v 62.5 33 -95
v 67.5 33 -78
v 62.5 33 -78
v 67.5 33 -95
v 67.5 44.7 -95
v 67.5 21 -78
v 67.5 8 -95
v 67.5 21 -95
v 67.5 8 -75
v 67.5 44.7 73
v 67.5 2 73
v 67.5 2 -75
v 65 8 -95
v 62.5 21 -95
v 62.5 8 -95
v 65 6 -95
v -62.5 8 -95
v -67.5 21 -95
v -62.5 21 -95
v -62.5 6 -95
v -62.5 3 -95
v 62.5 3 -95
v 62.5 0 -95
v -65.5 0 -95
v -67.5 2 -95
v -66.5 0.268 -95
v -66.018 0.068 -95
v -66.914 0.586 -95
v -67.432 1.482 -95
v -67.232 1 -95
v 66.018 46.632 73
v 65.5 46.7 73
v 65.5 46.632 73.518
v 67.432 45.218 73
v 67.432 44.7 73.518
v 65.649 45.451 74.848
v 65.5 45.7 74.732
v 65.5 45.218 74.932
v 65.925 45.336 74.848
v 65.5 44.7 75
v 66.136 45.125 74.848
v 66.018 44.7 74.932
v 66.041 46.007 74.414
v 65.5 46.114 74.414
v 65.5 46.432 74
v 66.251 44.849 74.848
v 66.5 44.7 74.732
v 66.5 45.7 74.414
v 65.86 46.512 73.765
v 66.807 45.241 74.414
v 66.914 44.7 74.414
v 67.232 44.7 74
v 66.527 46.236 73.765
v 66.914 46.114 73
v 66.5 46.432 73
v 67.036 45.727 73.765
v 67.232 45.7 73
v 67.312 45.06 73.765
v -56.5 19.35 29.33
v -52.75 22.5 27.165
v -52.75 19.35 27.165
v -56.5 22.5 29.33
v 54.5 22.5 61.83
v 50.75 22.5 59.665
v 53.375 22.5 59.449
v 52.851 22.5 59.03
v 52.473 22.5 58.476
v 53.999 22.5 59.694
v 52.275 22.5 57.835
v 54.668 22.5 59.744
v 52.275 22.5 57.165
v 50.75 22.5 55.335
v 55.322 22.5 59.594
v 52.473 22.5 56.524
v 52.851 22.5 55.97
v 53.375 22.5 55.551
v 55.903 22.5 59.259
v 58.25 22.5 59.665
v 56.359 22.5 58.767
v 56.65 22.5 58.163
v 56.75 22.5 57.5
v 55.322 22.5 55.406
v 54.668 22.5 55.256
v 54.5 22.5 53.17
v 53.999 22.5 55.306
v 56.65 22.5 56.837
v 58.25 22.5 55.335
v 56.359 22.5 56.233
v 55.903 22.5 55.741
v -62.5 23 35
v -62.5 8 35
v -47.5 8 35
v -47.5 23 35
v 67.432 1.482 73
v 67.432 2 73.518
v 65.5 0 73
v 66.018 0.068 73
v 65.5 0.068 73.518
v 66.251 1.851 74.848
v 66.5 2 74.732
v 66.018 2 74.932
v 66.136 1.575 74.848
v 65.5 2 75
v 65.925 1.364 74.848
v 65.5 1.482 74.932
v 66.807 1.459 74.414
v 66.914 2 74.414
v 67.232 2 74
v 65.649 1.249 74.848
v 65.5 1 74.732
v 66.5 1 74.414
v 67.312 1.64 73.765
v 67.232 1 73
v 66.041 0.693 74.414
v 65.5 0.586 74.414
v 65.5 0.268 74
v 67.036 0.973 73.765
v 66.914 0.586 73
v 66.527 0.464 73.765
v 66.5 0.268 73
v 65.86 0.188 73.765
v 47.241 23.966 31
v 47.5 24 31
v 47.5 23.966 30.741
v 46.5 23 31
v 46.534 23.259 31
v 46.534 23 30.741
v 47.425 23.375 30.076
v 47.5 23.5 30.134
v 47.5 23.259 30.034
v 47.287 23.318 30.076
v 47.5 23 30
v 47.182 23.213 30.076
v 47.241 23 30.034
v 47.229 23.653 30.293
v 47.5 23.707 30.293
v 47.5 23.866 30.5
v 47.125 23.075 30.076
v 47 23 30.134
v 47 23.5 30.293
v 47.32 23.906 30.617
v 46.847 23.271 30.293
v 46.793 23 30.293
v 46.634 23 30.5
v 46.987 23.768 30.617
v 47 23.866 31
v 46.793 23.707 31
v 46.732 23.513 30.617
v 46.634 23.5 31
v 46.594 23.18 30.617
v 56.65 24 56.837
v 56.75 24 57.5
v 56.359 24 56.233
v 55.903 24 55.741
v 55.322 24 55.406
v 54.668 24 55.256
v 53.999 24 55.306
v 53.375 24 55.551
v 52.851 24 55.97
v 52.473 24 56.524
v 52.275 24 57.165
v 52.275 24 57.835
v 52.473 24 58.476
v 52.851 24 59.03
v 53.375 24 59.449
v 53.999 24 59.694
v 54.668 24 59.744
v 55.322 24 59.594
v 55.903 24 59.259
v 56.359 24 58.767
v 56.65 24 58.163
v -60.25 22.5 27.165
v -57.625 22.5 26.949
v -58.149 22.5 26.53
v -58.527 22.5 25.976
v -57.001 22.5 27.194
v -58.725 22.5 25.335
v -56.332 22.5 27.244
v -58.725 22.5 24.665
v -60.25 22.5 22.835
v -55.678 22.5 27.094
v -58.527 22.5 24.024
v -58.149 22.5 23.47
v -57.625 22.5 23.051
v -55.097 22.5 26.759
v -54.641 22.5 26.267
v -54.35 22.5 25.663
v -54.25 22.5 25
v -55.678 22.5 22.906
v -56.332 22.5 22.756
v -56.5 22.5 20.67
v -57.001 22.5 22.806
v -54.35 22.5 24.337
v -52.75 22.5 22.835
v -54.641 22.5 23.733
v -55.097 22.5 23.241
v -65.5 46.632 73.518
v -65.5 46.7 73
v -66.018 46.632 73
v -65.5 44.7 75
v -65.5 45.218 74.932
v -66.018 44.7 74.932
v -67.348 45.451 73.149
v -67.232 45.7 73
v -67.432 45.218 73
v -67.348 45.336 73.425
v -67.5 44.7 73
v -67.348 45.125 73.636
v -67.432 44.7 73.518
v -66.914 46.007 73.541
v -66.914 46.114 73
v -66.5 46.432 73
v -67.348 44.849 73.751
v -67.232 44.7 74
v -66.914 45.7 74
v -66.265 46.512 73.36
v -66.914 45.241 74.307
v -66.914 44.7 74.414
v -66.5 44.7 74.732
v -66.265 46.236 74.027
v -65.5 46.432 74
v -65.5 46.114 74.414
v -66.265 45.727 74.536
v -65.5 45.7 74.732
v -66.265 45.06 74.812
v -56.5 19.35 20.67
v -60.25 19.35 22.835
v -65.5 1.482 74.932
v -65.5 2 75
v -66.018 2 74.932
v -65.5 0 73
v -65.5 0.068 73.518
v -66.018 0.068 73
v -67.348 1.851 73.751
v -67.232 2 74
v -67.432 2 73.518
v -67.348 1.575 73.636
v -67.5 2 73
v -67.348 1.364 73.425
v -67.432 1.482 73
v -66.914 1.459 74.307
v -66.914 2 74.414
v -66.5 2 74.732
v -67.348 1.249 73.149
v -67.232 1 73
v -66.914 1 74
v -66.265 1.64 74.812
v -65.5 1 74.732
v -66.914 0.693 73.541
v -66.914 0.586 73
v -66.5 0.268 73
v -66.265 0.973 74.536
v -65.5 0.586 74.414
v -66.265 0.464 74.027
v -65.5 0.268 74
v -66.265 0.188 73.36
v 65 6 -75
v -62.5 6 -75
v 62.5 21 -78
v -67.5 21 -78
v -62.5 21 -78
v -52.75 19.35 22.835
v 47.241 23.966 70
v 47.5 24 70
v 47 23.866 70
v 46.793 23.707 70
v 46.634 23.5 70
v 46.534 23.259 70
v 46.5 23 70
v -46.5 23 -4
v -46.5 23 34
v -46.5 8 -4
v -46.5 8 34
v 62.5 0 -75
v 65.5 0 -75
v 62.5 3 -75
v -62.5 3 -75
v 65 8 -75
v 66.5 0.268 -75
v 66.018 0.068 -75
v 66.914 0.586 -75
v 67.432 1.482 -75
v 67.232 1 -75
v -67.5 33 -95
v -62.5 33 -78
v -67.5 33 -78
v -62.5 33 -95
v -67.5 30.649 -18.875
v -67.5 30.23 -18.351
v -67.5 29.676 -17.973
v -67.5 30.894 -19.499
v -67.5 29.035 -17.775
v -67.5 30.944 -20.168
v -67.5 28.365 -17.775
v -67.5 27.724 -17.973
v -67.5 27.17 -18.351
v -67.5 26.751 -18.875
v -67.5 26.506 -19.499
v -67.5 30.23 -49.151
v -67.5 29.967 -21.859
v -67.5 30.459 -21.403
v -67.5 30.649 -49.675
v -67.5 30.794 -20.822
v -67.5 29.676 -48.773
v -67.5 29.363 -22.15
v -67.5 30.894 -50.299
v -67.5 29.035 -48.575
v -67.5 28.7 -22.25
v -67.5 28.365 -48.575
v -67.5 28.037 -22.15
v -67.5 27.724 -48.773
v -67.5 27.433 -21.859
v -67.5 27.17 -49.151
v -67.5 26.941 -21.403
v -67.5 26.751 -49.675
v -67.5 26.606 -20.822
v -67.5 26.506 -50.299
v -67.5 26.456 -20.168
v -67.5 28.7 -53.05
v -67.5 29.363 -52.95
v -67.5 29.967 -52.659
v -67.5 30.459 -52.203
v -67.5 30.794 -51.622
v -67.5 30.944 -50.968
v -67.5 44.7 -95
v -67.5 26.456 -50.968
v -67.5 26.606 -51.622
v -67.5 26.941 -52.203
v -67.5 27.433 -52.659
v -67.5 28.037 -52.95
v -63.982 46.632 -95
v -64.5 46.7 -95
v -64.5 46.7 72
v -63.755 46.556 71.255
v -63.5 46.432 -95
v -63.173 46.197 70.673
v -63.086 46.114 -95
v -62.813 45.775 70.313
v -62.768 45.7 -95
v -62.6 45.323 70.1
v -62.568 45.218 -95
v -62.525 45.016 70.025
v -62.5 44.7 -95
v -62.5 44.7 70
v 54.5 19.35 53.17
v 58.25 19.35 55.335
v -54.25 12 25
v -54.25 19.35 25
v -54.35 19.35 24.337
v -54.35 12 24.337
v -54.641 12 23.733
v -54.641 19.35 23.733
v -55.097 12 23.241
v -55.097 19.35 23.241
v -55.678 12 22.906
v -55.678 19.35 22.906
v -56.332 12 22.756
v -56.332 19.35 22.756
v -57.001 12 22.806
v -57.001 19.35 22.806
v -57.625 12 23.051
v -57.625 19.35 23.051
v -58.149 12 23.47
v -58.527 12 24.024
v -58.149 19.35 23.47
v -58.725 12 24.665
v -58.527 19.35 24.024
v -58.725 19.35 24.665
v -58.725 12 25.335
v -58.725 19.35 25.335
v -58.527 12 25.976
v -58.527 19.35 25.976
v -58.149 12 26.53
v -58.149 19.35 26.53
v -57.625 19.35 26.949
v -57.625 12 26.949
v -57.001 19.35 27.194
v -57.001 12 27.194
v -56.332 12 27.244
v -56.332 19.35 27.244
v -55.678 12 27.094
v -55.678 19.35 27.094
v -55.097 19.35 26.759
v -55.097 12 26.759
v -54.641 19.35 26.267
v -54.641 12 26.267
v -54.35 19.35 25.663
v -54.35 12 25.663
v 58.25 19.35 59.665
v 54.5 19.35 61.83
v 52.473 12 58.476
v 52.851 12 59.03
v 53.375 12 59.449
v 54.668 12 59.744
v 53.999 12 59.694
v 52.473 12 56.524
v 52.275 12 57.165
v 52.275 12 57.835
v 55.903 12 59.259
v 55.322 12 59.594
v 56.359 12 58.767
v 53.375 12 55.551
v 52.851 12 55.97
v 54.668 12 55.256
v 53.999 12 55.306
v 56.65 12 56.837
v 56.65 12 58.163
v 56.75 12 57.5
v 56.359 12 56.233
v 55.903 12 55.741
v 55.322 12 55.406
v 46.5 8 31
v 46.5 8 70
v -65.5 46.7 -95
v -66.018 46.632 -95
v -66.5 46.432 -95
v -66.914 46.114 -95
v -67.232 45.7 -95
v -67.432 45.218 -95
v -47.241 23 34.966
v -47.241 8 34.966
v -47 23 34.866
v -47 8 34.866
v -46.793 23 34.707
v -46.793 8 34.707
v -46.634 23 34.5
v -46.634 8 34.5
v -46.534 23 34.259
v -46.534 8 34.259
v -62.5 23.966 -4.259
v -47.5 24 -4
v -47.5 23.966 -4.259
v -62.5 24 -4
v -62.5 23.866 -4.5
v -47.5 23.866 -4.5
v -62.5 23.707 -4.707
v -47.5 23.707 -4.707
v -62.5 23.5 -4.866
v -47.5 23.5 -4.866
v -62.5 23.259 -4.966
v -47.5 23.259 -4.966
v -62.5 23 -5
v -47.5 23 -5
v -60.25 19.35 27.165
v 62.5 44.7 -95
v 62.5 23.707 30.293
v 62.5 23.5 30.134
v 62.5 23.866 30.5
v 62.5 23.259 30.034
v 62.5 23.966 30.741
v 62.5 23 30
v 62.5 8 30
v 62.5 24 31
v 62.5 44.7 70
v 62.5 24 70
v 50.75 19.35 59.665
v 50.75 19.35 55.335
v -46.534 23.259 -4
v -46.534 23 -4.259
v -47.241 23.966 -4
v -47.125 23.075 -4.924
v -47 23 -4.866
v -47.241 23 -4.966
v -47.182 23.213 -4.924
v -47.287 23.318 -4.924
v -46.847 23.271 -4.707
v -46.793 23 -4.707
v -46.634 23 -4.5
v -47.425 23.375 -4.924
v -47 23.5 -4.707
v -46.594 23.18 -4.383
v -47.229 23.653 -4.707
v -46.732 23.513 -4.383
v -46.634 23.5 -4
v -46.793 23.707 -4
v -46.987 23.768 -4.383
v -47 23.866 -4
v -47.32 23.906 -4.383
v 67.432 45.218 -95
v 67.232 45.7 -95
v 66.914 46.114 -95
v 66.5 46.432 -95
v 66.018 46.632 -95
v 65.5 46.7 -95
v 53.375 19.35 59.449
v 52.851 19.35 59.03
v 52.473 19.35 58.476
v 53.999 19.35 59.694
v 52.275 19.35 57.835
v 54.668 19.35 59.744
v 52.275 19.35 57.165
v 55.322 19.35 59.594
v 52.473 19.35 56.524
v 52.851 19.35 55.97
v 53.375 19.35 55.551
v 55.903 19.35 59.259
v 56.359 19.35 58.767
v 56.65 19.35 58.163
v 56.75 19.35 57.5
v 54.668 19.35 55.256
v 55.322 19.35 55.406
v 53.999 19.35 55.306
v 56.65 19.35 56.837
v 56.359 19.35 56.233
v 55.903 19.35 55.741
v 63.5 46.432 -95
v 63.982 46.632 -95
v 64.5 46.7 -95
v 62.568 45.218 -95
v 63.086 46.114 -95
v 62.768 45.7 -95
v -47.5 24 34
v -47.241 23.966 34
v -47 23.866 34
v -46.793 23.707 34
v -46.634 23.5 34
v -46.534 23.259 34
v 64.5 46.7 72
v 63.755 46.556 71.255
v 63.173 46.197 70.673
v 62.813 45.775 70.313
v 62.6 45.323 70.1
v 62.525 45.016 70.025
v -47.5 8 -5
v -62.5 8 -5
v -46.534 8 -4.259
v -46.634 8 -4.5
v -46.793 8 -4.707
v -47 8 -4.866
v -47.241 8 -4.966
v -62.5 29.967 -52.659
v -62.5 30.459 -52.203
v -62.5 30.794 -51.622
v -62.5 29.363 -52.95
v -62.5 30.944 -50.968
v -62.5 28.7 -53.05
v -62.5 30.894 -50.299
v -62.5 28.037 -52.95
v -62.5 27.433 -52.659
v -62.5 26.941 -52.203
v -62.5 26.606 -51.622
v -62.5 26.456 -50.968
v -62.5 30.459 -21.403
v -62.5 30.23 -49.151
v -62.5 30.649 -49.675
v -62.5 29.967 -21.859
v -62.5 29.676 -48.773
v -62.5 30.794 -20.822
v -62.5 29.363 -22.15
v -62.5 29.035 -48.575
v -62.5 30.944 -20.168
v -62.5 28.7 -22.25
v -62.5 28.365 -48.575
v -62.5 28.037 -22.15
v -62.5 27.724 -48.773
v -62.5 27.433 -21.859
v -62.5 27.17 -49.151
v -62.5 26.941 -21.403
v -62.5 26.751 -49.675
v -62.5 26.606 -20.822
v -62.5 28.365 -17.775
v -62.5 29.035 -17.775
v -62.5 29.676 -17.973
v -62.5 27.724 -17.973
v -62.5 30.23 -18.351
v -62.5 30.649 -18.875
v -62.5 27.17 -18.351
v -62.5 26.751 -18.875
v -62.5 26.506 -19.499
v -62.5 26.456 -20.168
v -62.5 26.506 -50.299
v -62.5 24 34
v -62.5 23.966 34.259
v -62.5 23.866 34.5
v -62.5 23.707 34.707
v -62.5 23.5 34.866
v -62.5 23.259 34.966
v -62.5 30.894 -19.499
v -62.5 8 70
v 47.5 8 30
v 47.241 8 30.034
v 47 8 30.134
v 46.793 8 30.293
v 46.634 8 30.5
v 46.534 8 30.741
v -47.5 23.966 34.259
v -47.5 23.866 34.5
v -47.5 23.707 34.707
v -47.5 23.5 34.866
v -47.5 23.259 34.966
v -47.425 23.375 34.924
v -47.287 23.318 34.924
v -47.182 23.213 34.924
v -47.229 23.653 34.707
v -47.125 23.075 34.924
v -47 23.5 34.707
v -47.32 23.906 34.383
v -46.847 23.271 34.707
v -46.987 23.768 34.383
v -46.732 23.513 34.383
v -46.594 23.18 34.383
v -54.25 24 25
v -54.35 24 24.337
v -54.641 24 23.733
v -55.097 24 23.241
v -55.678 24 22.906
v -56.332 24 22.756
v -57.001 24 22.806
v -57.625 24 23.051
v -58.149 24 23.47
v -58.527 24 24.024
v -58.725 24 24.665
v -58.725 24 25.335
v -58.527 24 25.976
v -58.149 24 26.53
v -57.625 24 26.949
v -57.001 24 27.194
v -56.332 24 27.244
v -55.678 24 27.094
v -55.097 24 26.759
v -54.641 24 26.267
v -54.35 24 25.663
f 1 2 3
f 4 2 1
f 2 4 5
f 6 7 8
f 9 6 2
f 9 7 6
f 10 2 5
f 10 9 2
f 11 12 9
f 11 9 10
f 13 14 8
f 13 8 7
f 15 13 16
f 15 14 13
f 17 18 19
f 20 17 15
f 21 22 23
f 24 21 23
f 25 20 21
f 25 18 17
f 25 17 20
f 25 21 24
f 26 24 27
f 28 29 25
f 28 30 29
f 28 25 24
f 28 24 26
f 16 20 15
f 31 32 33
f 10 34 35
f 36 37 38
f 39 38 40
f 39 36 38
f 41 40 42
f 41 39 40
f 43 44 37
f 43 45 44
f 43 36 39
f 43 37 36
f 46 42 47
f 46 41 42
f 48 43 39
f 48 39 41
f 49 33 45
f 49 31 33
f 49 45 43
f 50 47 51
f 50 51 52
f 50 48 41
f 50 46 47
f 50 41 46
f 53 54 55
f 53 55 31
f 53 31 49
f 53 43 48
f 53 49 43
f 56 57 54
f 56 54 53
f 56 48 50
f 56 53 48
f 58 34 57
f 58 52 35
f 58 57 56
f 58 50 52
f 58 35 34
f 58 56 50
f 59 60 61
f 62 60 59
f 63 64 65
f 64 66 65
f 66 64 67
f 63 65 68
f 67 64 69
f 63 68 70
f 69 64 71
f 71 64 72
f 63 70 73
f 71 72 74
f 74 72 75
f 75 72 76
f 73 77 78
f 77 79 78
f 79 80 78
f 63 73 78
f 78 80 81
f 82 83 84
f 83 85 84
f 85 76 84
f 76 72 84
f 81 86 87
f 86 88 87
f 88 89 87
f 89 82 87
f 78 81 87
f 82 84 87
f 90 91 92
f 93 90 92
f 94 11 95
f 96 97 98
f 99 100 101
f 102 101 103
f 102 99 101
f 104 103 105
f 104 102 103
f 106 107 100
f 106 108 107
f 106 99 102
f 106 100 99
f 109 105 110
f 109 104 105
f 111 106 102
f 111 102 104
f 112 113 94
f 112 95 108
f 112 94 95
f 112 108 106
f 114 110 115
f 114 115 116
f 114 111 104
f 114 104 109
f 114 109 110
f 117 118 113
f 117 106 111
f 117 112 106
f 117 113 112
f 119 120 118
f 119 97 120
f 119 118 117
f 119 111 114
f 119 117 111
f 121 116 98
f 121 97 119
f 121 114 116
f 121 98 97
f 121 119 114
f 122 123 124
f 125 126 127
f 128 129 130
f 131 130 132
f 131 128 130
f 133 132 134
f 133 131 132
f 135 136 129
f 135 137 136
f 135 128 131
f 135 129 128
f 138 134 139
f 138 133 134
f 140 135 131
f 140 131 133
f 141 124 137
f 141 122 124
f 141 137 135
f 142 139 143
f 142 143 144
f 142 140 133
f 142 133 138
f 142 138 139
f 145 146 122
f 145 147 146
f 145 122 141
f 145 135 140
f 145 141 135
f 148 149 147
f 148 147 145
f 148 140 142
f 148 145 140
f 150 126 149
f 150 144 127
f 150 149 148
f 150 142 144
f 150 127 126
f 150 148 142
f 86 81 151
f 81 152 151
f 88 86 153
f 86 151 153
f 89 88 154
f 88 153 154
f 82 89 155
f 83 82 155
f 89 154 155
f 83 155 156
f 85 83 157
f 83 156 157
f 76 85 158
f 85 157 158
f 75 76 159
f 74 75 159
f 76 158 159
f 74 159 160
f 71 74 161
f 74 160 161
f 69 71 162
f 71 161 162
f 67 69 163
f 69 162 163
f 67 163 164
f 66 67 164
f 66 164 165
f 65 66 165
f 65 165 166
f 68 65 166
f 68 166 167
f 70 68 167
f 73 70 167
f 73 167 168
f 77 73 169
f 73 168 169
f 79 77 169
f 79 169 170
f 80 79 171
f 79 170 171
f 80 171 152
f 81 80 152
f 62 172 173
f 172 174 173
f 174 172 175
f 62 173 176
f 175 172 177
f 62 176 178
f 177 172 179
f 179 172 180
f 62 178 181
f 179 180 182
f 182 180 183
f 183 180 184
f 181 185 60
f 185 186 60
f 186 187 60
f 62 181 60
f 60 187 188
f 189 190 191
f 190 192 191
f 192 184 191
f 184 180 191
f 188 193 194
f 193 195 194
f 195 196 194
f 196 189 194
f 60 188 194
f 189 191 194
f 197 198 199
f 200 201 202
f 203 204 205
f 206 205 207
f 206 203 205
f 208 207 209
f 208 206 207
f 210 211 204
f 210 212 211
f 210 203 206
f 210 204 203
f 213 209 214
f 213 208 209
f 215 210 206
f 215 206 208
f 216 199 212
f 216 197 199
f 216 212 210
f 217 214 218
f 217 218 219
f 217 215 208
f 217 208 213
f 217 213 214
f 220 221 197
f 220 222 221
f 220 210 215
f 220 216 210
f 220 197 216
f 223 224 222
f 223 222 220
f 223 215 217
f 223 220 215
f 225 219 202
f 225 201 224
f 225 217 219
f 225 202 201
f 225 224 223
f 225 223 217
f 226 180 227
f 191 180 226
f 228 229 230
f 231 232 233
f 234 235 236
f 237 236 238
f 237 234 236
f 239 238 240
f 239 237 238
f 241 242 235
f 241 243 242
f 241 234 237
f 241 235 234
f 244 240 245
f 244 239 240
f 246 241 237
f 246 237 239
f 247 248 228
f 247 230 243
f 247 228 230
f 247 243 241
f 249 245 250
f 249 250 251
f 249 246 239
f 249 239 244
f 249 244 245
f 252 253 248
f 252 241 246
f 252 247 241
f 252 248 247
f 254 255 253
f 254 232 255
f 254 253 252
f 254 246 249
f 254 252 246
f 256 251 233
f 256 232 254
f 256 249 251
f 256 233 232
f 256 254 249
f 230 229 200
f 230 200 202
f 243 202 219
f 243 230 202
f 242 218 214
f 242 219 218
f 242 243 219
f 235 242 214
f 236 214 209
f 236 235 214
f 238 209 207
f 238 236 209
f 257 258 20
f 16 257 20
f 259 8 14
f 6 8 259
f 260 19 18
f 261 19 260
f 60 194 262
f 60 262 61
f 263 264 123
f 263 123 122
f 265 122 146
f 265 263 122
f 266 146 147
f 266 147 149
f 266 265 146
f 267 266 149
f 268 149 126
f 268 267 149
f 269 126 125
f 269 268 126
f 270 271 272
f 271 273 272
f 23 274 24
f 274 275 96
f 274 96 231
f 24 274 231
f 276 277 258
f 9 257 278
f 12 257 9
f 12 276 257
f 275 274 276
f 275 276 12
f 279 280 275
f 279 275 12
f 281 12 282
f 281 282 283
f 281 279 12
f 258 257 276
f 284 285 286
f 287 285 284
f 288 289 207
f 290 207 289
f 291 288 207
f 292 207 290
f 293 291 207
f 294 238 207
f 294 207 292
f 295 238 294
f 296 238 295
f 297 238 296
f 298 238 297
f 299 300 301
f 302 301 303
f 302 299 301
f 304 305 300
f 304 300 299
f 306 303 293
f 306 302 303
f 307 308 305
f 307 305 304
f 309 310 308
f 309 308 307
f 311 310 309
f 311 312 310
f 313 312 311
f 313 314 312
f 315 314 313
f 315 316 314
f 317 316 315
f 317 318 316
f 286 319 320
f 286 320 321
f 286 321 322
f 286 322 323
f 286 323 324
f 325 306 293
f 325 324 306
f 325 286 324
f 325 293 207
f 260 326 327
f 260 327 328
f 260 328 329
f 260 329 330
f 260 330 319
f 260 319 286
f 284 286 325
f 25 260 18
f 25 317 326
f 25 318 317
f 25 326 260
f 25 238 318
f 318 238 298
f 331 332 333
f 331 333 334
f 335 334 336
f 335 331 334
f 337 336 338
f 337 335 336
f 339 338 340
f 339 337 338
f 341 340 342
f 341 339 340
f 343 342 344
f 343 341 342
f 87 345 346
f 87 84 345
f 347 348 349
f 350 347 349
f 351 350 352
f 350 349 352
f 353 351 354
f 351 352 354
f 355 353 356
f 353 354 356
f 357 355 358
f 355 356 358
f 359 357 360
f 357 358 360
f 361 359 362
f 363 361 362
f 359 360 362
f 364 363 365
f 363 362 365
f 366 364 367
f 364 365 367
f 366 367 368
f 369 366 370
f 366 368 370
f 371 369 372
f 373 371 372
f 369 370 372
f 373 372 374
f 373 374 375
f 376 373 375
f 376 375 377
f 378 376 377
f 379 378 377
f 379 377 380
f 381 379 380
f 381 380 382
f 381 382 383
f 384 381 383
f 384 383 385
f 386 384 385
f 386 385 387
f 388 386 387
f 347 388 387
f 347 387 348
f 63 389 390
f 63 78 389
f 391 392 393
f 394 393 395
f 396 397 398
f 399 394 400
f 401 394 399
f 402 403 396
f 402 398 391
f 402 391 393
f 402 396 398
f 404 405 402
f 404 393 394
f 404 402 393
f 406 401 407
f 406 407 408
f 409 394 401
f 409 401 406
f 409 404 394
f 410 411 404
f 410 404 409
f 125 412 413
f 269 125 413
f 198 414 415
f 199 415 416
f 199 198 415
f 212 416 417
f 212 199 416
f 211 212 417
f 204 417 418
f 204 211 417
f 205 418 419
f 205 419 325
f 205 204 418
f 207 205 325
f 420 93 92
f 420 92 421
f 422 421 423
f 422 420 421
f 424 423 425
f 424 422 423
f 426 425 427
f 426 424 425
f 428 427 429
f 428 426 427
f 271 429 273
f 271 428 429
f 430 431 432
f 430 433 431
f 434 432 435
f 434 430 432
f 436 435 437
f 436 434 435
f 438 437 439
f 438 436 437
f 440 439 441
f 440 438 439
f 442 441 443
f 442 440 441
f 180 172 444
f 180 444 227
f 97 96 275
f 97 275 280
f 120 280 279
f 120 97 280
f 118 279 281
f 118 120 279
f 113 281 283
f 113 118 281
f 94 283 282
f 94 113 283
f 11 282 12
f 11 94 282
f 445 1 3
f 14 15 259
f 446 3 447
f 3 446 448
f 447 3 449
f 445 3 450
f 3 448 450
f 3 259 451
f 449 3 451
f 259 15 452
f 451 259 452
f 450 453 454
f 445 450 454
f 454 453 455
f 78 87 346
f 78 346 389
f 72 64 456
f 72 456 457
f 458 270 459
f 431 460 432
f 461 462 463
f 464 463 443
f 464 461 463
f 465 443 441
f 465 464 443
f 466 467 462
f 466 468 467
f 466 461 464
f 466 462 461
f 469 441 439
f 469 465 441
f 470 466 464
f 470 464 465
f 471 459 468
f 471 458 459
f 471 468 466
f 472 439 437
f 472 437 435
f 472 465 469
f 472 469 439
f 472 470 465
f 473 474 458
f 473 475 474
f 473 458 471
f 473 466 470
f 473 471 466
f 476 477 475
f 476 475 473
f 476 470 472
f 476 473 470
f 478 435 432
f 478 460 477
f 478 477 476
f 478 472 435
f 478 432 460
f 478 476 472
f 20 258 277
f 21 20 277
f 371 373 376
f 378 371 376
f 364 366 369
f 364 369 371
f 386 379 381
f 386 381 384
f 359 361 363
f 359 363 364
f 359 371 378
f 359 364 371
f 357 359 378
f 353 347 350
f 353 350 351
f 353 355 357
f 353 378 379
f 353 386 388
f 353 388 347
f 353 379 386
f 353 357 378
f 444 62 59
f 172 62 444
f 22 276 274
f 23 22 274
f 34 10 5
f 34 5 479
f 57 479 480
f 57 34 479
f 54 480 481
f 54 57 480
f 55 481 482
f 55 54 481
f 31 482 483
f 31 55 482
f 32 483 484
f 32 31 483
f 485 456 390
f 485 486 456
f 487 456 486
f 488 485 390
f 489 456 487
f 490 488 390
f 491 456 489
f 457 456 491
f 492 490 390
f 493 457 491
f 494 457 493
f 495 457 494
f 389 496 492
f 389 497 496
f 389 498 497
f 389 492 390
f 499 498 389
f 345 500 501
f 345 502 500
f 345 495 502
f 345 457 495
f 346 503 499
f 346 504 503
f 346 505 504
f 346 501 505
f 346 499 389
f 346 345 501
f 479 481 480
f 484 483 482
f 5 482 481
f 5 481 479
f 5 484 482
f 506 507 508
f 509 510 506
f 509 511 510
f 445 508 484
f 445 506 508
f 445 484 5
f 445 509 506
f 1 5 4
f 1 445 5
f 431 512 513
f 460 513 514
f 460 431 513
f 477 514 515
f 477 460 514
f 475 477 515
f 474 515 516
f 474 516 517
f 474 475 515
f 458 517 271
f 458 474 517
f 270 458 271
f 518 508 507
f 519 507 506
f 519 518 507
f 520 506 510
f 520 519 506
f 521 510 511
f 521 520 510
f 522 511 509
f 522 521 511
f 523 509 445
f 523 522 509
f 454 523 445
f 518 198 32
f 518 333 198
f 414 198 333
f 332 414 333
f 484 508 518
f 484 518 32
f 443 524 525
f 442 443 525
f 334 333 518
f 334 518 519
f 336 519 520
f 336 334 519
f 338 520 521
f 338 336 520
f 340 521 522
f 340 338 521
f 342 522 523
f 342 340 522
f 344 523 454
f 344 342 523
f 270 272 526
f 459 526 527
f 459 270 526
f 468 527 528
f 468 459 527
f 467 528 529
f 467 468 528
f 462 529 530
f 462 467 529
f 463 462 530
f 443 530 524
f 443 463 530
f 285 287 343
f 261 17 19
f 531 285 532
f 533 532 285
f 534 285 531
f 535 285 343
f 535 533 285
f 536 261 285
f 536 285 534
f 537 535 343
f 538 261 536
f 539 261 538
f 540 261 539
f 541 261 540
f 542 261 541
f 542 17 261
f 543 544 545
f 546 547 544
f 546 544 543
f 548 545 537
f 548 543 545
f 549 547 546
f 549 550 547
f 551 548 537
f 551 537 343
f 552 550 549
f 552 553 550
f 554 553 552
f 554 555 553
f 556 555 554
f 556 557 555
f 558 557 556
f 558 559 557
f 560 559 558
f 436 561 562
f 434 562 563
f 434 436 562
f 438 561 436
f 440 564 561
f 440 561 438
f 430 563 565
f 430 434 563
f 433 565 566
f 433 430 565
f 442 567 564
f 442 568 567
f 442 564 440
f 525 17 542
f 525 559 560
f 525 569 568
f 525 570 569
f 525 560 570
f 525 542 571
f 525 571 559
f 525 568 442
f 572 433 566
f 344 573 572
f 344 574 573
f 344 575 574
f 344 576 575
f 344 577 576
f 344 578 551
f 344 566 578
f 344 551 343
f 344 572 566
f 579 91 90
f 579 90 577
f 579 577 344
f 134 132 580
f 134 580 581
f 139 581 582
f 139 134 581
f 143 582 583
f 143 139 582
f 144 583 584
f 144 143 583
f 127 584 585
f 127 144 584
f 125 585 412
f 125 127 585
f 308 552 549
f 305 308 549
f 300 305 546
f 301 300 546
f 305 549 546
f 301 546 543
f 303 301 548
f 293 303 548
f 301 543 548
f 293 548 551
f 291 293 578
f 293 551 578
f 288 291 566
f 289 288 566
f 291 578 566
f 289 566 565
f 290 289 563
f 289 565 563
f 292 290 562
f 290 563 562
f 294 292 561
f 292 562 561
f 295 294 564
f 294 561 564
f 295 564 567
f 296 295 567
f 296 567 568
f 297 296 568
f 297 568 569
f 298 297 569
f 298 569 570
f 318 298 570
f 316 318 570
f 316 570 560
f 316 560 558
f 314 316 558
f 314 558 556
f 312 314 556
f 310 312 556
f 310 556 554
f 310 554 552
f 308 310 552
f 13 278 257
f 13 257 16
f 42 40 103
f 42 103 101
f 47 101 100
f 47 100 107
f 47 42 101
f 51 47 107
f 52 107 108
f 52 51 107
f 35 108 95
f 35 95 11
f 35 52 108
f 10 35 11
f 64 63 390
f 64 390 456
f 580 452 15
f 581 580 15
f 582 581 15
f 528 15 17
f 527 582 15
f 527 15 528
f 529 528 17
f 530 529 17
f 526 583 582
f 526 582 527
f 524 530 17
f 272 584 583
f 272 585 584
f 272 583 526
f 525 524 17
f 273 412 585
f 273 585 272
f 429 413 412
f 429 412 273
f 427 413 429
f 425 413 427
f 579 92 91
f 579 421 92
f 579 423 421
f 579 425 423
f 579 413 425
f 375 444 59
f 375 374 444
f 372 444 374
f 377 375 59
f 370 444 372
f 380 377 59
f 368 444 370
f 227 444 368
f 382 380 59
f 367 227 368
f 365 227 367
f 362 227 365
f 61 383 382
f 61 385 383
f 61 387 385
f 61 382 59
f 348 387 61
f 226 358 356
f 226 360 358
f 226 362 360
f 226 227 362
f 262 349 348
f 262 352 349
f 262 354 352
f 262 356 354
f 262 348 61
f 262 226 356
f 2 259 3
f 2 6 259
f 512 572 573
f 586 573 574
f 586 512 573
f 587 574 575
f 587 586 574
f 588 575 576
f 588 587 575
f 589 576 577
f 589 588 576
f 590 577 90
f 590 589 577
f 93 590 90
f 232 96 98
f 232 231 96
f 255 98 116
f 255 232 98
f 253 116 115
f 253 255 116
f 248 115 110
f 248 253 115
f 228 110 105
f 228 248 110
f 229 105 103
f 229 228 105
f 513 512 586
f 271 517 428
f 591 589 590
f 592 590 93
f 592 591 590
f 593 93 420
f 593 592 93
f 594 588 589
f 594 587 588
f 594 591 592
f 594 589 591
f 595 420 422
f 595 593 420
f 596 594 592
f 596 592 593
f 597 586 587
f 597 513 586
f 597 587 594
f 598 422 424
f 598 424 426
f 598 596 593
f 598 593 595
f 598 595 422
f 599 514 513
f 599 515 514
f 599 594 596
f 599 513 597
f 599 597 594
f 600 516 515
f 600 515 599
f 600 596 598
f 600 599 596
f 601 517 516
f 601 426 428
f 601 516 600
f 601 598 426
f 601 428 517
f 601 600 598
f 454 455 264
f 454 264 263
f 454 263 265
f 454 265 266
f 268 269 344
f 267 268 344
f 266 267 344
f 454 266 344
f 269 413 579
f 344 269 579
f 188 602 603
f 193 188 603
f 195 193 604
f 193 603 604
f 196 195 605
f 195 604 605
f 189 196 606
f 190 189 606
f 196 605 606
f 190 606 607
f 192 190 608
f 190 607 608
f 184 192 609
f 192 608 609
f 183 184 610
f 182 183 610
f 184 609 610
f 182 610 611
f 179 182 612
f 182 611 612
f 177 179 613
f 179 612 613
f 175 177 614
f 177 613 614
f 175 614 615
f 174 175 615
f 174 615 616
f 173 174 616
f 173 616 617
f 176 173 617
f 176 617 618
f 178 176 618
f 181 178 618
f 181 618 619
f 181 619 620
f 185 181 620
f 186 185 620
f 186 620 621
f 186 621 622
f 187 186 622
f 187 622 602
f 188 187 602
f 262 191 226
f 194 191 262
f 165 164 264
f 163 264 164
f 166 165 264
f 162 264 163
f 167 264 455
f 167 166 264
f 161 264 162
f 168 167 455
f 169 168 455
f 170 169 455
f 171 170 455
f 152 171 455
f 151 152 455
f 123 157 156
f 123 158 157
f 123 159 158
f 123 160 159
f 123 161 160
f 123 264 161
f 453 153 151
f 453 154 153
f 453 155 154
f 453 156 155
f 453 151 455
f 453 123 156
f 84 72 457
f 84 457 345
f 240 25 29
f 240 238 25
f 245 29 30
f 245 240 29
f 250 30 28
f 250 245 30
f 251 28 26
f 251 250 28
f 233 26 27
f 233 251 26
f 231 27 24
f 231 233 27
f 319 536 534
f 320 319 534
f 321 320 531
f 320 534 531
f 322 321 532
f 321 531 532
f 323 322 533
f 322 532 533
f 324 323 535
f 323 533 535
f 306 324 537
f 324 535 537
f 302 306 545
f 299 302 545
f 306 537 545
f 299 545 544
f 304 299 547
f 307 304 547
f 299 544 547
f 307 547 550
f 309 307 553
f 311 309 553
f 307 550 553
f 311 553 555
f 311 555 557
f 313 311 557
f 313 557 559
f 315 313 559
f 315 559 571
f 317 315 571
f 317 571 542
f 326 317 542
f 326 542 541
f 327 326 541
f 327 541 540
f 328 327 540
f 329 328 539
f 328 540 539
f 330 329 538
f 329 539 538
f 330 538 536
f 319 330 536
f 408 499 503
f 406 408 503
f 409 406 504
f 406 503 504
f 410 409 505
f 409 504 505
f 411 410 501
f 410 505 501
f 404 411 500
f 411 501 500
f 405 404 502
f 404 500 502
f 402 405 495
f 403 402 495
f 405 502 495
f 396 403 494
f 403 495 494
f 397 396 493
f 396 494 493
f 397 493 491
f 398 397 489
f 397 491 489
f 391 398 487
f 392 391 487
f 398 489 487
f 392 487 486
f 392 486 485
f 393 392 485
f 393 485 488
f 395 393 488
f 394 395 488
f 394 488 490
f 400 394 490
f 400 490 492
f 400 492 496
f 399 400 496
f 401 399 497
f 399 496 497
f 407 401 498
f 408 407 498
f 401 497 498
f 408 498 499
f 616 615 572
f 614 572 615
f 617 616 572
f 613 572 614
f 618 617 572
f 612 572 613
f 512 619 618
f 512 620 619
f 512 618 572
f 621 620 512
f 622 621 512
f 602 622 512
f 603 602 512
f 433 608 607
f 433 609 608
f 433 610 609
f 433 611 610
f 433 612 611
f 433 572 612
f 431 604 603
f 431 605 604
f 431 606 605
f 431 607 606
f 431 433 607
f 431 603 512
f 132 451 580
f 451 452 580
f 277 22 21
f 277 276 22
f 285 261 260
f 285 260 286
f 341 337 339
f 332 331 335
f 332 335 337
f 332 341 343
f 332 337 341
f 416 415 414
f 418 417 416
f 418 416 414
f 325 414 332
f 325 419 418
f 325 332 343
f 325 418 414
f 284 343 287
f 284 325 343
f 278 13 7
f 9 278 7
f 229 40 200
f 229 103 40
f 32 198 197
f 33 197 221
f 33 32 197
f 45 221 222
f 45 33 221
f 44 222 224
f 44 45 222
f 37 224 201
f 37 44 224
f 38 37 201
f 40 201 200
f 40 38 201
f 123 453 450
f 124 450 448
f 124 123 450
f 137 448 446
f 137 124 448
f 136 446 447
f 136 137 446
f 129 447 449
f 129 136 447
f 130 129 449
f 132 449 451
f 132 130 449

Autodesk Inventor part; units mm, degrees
sketch "Sketch1" plane through (0, 0, 0) normal (0, 1, 0) x (-1, 0, 0)
  line L0 (-67.5, 75) -> (67.5, 75)
  line L1 (67.5, 75) -> (67.5, -75)
  line L2 (67.5, -75) -> (-67.5, -75)
  line L3 (-67.5, -75) -> (-67.5, 75)
  line L4 (-67.5, 75) -> (67.5, -75) construction
  line L5 (67.5, 75) -> (-67.5, -75) construction
  point P0 (0, 0)
  dimension "d0" = 135
  dimension "d1" = 150
extrude "Extrusion1" add sketch "Sketch1" along normal blind 8
sketch "Sketch3" plane through (0, 8, 0) normal (0, 1, 0) x (1, 0, 0)
  line L0 (-67.5, -75) -> (67.5, -75) projected
  line L1 (67.5, -75) -> (67.5, 75) projected
  line L2 (67.5, 75) -> (-67.5, 75) projected
  line L3 (-67.5, 75) -> (-67.5, -75) projected
  line L4 (62.5, 75) -> (62.5, -70)
  line L5 (-67.5, -75) -> (67.5, -75) projected
  line L6 (67.5, -75) -> (67.5, 75) projected
  line L7 (0, 0) -> (0, -83) construction
  line L8 (-62.5, 75) -> (-62.5, -70)
  line L9 (62.5, -70) -> (-62.5, -70)
  dimension "d4" = 5
  dimension "d5" = 5
extrude "Extrusion2" add sketch "Sketch3" along normal blind 38.7 contours L3 L2 L8 L9 L4 L1 L0
sketch "Sketch4" plane through (67.5, 0, -75) normal (0, 0, -1) x (-1, 0, 0)
  line L0 (135, 0) -> (0, 0) projected
  line L1 (135, 0) -> (135, 46.7) projected
  line L2 (130, 46.7) -> (135, 46.7) projected
  line L3 (130, 8) -> (130, 46.7) projected
  line L4 (5, 8) -> (130, 8) projected
  line L5 (5, 8) -> (5, 46.7) projected
  line L6 (0, 46.7) -> (5, 46.7) projected
  line L7 (0, 0) -> (0, 46.7) projected
  line L8 (130, 8) -> (5, 8) projected
  line L9 (5, 8) -> (5, 0)
  line L10 (130, 8) -> (130, 0)
  line L11 (0, 0) -> (135, 0) projected
  line L12 (0, 0) -> (0, 46.7) projected
  line L13 (5, 3) -> (130, 3)
  line L14 (5, 8) -> (130, 8) projected
  line L15 (5, 6) -> (130, 6)
  line L16 (5, 8) -> (0, 8)
  line L17 (135, 0) -> (0, 0) projected
  point P0 (67.5, 0)
  dimension "d8" = 3
  dimension "d9" = 3
extrude "Extrusion3" add sketch "Sketch4" along normal blind 20 contours L0 L10 L3 L2 L1 | L0 L9 L13 L10 | L15 L9 L4 L10 | L7 L6 L5 L16
sketch "Sketch6" plane through (67.5, 0, 75) normal (1, 0, 0) x (0, 0, -1)
  line L0 (150, 0) -> (150, 8)
  line L1 (0, 0) -> (0, 46.7) projected
  line L2 (150, 8) -> (170, 8) projected
  line L3 (0, 46.7) -> (170, 46.7) projected
  line L4 (170, 46.7) -> (170, 8) projected
  line L5 (170, 21) -> (153, 21)
  line L6 (153, 21) -> (153, 33)
  line L7 (153, 33) -> (170, 33)
  line L8 (170, 33) -> (170, 21)
  point P0 (75, 0)
  dimension "d92" = 13
  dimension "d93" = 17
  dimension "d94" = 12
fillet "Fillet1" radius 2 11 edges at (67.5, 0, 0) (67.5, 46.7, -10) (67.5, 23.35, 75) (0, 46.7, 75) (0, 0, 75) (-67.5, 46.7, -10) (-67.5, 23.35, 75) (-67.5, 0, -10) (62.5, 46.7, -12.5) (-62.5, 46.7, -12.5) (0, 46.7, 70)
ref_plane "Work Plane4" through (-67.5, 9.7, -88) normal (-1, 0, 0) x (0, 0, 1)
sketch "Sketch15" plane through (62.5, 6, -75) normal (1, 0, 0) x (0, 0, -1)
  line L0 (0, 0) -> (0, 2) projected
  line L1 (0, 0) -> (20, 0) projected
  line L2 (20, 2) -> (20, 0) projected
  line L3 (0, 2) -> (20, 2) projected
  point P0 (-75, -6)
extrude "Extrusion8" add sketch "Sketch15" along normal blind 2.5
sketch "Sketch16" plane through (0, 8, 0) normal (0, 1, 0) x (1, 0, 0)
  line L0 (-62.5, -35) -> (-46.5, -35)
  line L1 (-46.5, -35) -> (-46.5, 5)
  line L2 (-46.5, 5) -> (-62.5, 5)
  line L3 (-62.5, 5) -> (-62.5, -35)
  line L4 (62.5, -70) -> (-62.5, -70) projected
  line L5 (-62.5, -70) -> (-62.5, 95) projected
  line L6 (46.5, -70) -> (62.5, -70)
  line L7 (62.5, -70) -> (62.5, -30)
  line L8 (62.5, -30) -> (46.5, -30)
  line L9 (46.5, -30) -> (46.5, -70)
  line L10 (62.5, 95) -> (62.5, -70) projected
  point P0 (0, 0)
  dimension "d39" = 35
  dimension "d40" = 0
  dimension "d41" = 16
  dimension "d42" = 40
  dimension "d43" = 0
  dimension "d44" = 0
  dimension "d45" = 40
  dimension "d46" = 16
extrude "Extrusion9" add sketch "Sketch16" along normal blind 16
fillet "Fillet4" radius 1 8 edges at (46.5, 24, 50) (54.5, 24, 30) (46.5, 16, 30) (-46.5, 24, 15) (-46.5, 16, -5) (-54.5, 24, 35) (-54.5, 24, -5) (-46.5, 16, 35)
sketch "Sketch17" plane through (0, 24, 0) normal (0, 1, 0) x (1, 0, 0)
  circle A0 centre (-56.5, -25) radius 2.25
  line L0 (-62.5, -34) -> (-62.5, 4) projected
  line L1 (-47.5, -34) -> (-62.5, -34) projected
  circle A1 centre (54.5, -57.5) radius 2.25
  line L2 (47.5, -70) -> (47.5, -31) projected
  line L3 (47.5, -31) -> (62.5, -31) projected
  line L4 (62.5, -70) -> (50.5, -70) projected
  point P0 (0, 0)
  dimension "d50" = 4.5
  dimension "d51" = 6
  dimension "d52" = 9
  dimension "d53" = 4.5
  dimension "d54" = 7
  dimension "d90" = 12.5
extrude "Extrusion10" cut sketch "Sketch17" against normal blind 12
ref_plane "Work Plane5" through (-62.5, 9.7, -88) normal (1, 0, 0) x (0, 0, -1)
sketch "Sketch18" plane through (-62.5, 9.7, -88) normal (1, 0, 0) x (0, 0, -1)
  circle A0 centre (-68, 19) radius 2.25
  circle A1 centre (-37.2, 19) radius 2.25
  line L0 (0, 8.1) -> (0, 14.1)
  line L1 (-37.2, 19) -> (-68, 19)
  line L2 (7, 37) -> (-160, 37) projected
  line L3 (-158, -1.7) -> (-158, 35) projected
  point P0 (-88, -9.7)
  dimension "d60" = 4.5
  dimension "d61" = 4.5
  dimension "d62" = 30.8
  dimension "d67" = 90
  dimension "d91" = 18
extrude "Extrusion11" cut sketch "Sketch18" against normal through all
ref_plane "Work Plane3" through (0, 22.5, 0) normal (0, 1, 0) x (1, 0, 0)
sketch "Sketch21" plane through (0, 22.5, 0) normal (0, 1, 0) x (1, 0, 0)
  circle A0 centre (54.5, -57.5) radius 2.25 projected
  line L0 (50.75, -55.3349) -> (54.5, -53.1699)
  line L1 (54.5, -53.1699) -> (58.25, -55.3349)
  line L2 (58.25, -55.3349) -> (58.25, -59.6651)
  line L3 (58.25, -59.6651) -> (54.5, -61.8301)
  line L4 (54.5, -61.8301) -> (50.75, -59.6651)
  line L5 (50.75, -59.6651) -> (50.75, -55.3349)
  line L6 (-62.5, -35) -> (-62.5, -70) projected
  line L7 (46.5, -70) -> (46.5, -31) projected
  circle A1 centre (-56.5, -25) radius 2.25 projected
  line L8 (-52.75, -27.1651) -> (-56.5, -29.3301)
  line L9 (-56.5, -29.3301) -> (-60.25, -27.1651)
  line L10 (-60.25, -27.1651) -> (-60.25, -22.8349)
  line L11 (-60.25, -22.8349) -> (-56.5, -20.6699)
  line L12 (-56.5, -20.6699) -> (-52.75, -22.8349)
  line L13 (-52.75, -22.8349) -> (-52.75, -27.1651)
  point P0 (0, 0)
  dimension "d78" = 7.5
  dimension "d79" = 7.5
extrude "Extrusion13" cut sketch "Sketch21" against normal blind 3.15
extrude "Extrusion14" cut sketch "Sketch6" against normal through all
properties part number "Case_metà1"
